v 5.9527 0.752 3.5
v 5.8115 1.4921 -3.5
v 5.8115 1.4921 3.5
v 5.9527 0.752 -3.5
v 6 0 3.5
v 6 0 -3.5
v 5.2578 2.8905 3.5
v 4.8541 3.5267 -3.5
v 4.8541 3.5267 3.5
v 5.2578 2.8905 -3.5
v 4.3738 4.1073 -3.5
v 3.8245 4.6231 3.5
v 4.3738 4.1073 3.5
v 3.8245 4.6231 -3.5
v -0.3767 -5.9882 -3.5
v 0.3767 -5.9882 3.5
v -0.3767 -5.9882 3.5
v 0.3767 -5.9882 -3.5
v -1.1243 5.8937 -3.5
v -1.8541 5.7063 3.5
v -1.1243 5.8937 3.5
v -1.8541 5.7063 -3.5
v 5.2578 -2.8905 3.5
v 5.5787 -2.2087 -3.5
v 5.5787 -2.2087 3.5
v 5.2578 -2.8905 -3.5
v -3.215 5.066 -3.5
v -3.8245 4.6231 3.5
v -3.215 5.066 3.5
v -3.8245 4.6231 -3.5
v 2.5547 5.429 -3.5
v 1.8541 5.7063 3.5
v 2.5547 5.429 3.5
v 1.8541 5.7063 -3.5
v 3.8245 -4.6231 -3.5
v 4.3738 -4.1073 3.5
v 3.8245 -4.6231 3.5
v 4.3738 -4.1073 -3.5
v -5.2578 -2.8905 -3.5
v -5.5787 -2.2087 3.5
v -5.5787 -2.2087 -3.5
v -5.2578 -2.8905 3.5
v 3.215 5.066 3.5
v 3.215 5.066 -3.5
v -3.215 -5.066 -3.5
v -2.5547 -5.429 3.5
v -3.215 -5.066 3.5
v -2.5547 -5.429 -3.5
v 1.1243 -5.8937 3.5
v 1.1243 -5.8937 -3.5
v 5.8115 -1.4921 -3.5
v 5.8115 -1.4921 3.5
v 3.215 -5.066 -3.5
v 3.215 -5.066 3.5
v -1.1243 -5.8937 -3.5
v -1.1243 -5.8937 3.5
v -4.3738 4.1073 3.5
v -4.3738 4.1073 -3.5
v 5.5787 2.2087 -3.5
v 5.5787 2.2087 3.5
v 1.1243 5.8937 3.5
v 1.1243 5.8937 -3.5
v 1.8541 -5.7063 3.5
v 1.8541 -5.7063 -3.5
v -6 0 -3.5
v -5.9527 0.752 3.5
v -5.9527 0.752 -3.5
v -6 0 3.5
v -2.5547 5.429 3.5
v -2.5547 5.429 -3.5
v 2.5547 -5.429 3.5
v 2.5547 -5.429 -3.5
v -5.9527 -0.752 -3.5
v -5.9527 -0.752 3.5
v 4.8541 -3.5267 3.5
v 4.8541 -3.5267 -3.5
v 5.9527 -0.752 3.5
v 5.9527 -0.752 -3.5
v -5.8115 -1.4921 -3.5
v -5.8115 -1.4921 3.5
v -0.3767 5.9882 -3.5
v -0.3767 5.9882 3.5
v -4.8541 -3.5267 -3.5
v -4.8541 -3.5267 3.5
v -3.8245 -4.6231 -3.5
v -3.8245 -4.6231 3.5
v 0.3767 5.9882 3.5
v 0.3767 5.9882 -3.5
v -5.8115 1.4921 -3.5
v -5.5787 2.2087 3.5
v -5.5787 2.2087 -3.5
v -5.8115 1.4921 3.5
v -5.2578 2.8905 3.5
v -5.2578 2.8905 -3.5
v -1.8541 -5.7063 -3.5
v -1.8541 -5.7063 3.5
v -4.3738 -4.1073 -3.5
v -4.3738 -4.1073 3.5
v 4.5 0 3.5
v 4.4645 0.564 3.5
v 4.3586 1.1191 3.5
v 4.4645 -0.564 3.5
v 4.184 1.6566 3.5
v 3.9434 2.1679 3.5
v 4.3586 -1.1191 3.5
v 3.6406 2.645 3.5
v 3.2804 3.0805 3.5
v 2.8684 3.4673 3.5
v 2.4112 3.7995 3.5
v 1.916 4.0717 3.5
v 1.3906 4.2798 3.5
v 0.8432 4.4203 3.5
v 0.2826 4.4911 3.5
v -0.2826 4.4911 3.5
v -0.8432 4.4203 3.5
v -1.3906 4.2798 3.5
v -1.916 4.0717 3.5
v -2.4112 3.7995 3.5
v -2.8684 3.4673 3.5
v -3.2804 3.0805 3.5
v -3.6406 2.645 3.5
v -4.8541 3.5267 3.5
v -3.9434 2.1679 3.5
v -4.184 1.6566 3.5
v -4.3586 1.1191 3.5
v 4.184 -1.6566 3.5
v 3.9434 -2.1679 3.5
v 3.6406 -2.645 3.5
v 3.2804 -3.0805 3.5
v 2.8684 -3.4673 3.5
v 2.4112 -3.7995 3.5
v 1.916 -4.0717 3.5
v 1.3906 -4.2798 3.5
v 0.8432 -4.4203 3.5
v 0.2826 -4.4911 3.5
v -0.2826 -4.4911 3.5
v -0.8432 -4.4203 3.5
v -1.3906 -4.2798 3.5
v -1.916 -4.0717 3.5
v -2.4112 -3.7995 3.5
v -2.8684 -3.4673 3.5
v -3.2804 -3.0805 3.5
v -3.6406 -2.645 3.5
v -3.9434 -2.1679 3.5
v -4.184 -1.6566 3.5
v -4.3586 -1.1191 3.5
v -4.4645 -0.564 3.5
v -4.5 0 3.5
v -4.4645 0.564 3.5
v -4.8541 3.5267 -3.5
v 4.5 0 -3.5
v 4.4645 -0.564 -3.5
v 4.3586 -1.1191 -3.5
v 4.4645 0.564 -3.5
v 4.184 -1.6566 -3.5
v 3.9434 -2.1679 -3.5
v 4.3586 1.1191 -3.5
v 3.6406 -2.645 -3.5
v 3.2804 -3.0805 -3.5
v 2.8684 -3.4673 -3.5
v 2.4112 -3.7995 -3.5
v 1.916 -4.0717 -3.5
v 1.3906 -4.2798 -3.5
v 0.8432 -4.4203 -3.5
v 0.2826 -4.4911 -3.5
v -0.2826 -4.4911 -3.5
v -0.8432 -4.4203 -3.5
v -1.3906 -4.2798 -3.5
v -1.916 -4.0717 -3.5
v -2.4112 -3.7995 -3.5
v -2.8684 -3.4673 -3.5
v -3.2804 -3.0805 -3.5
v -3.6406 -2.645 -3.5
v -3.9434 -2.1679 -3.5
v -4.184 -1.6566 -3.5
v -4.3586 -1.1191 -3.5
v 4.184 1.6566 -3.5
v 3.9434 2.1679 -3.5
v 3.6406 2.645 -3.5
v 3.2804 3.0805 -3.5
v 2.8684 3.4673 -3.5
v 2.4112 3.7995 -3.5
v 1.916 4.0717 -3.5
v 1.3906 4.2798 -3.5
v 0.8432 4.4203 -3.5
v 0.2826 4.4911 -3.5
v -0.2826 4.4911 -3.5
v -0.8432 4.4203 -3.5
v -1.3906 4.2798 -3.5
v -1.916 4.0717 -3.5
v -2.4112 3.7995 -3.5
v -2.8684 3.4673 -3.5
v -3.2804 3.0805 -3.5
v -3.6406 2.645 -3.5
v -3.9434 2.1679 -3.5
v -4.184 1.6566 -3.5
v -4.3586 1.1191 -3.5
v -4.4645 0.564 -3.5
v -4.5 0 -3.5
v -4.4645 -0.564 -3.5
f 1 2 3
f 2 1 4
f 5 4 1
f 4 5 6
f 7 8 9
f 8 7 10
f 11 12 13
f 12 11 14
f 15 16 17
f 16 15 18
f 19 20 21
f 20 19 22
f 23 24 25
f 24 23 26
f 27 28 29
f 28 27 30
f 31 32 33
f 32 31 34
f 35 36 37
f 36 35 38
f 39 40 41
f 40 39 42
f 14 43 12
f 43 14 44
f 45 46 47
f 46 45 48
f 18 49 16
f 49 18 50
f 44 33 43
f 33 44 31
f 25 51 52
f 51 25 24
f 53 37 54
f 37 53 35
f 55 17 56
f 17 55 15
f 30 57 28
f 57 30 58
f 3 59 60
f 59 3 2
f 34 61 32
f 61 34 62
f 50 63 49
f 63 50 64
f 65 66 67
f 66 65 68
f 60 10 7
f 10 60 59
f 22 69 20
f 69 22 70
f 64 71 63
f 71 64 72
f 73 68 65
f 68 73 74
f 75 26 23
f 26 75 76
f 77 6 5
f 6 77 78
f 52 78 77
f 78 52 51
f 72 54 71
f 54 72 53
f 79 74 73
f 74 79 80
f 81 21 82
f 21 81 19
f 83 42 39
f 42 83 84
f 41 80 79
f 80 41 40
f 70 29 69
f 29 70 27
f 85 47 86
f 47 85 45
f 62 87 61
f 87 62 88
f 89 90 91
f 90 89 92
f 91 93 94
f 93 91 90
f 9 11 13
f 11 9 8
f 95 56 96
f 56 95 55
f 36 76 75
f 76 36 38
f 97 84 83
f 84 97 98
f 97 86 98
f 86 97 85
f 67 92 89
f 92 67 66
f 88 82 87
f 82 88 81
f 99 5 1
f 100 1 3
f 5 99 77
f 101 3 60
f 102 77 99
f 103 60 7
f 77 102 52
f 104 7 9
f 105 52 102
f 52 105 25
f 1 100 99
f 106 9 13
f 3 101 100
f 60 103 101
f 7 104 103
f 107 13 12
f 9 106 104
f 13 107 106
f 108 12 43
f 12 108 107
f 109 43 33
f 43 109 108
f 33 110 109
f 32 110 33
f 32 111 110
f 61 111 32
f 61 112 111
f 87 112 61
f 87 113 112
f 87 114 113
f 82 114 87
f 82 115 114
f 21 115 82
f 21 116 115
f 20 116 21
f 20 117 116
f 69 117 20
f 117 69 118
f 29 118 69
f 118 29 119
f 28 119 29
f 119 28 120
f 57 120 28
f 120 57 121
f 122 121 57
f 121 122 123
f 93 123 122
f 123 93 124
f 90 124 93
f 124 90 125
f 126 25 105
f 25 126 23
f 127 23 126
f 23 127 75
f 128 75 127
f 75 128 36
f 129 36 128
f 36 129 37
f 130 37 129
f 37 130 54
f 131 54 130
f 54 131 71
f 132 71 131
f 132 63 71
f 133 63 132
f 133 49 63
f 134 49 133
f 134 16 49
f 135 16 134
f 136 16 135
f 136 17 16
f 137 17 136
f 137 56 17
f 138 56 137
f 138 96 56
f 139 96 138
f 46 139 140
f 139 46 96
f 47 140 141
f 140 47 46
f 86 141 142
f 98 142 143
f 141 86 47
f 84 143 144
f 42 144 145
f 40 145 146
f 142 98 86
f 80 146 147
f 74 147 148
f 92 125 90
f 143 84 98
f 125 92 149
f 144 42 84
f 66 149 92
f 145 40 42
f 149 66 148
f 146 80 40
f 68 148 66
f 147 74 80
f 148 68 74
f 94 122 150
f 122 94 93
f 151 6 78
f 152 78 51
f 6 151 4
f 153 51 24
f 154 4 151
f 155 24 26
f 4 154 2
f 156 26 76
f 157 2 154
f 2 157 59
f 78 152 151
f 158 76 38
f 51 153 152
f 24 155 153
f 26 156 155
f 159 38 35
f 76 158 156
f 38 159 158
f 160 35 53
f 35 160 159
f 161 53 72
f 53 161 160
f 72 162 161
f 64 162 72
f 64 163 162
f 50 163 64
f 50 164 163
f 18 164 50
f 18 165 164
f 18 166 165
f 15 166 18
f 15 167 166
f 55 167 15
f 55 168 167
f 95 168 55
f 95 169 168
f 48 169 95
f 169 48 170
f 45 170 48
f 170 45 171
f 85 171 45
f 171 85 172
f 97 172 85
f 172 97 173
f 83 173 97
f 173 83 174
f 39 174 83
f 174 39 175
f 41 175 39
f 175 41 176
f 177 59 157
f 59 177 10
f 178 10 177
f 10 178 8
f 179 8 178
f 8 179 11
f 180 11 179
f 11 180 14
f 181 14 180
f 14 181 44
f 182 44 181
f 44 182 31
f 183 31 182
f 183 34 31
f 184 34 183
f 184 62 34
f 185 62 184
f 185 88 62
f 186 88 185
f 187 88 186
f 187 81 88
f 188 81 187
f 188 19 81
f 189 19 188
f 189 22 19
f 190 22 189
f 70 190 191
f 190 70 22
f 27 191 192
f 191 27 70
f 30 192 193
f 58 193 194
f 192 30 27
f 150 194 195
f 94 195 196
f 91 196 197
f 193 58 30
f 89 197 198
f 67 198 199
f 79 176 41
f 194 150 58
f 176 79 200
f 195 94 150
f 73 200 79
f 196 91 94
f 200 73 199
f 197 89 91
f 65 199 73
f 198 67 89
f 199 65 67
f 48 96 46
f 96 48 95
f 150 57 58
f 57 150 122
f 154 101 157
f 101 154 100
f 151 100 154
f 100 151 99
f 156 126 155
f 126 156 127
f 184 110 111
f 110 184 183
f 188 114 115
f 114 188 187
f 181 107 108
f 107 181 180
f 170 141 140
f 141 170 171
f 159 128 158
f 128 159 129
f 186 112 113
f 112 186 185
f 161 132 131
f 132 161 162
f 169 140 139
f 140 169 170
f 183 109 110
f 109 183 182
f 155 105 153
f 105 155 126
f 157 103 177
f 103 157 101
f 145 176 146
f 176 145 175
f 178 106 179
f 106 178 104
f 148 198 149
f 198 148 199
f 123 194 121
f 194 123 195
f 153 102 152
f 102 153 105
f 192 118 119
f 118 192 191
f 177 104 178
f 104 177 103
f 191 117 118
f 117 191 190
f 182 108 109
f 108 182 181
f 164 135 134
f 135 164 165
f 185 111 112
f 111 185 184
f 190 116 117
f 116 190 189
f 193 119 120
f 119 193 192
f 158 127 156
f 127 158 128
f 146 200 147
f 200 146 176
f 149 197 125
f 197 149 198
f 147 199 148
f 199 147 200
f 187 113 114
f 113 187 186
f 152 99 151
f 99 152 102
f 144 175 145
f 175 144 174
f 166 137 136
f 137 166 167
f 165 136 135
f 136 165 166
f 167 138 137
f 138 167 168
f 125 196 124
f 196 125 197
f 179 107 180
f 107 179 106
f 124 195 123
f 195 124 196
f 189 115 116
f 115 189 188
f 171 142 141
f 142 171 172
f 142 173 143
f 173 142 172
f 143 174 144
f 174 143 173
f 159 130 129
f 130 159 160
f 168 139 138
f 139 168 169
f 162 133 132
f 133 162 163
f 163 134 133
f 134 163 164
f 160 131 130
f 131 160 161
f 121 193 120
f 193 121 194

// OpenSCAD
$fn = 50;


difference() {
	union() {
		translate(v = [0, 0, -3.5000000000]) {
			cylinder(h = 7, r = 6.0000000000);
		}
	}
	union() {
		translate(v = [0, 0, -100.0000000000]) {
			cylinder(h = 200, r = 4.5000000000);
		}
	}
}
